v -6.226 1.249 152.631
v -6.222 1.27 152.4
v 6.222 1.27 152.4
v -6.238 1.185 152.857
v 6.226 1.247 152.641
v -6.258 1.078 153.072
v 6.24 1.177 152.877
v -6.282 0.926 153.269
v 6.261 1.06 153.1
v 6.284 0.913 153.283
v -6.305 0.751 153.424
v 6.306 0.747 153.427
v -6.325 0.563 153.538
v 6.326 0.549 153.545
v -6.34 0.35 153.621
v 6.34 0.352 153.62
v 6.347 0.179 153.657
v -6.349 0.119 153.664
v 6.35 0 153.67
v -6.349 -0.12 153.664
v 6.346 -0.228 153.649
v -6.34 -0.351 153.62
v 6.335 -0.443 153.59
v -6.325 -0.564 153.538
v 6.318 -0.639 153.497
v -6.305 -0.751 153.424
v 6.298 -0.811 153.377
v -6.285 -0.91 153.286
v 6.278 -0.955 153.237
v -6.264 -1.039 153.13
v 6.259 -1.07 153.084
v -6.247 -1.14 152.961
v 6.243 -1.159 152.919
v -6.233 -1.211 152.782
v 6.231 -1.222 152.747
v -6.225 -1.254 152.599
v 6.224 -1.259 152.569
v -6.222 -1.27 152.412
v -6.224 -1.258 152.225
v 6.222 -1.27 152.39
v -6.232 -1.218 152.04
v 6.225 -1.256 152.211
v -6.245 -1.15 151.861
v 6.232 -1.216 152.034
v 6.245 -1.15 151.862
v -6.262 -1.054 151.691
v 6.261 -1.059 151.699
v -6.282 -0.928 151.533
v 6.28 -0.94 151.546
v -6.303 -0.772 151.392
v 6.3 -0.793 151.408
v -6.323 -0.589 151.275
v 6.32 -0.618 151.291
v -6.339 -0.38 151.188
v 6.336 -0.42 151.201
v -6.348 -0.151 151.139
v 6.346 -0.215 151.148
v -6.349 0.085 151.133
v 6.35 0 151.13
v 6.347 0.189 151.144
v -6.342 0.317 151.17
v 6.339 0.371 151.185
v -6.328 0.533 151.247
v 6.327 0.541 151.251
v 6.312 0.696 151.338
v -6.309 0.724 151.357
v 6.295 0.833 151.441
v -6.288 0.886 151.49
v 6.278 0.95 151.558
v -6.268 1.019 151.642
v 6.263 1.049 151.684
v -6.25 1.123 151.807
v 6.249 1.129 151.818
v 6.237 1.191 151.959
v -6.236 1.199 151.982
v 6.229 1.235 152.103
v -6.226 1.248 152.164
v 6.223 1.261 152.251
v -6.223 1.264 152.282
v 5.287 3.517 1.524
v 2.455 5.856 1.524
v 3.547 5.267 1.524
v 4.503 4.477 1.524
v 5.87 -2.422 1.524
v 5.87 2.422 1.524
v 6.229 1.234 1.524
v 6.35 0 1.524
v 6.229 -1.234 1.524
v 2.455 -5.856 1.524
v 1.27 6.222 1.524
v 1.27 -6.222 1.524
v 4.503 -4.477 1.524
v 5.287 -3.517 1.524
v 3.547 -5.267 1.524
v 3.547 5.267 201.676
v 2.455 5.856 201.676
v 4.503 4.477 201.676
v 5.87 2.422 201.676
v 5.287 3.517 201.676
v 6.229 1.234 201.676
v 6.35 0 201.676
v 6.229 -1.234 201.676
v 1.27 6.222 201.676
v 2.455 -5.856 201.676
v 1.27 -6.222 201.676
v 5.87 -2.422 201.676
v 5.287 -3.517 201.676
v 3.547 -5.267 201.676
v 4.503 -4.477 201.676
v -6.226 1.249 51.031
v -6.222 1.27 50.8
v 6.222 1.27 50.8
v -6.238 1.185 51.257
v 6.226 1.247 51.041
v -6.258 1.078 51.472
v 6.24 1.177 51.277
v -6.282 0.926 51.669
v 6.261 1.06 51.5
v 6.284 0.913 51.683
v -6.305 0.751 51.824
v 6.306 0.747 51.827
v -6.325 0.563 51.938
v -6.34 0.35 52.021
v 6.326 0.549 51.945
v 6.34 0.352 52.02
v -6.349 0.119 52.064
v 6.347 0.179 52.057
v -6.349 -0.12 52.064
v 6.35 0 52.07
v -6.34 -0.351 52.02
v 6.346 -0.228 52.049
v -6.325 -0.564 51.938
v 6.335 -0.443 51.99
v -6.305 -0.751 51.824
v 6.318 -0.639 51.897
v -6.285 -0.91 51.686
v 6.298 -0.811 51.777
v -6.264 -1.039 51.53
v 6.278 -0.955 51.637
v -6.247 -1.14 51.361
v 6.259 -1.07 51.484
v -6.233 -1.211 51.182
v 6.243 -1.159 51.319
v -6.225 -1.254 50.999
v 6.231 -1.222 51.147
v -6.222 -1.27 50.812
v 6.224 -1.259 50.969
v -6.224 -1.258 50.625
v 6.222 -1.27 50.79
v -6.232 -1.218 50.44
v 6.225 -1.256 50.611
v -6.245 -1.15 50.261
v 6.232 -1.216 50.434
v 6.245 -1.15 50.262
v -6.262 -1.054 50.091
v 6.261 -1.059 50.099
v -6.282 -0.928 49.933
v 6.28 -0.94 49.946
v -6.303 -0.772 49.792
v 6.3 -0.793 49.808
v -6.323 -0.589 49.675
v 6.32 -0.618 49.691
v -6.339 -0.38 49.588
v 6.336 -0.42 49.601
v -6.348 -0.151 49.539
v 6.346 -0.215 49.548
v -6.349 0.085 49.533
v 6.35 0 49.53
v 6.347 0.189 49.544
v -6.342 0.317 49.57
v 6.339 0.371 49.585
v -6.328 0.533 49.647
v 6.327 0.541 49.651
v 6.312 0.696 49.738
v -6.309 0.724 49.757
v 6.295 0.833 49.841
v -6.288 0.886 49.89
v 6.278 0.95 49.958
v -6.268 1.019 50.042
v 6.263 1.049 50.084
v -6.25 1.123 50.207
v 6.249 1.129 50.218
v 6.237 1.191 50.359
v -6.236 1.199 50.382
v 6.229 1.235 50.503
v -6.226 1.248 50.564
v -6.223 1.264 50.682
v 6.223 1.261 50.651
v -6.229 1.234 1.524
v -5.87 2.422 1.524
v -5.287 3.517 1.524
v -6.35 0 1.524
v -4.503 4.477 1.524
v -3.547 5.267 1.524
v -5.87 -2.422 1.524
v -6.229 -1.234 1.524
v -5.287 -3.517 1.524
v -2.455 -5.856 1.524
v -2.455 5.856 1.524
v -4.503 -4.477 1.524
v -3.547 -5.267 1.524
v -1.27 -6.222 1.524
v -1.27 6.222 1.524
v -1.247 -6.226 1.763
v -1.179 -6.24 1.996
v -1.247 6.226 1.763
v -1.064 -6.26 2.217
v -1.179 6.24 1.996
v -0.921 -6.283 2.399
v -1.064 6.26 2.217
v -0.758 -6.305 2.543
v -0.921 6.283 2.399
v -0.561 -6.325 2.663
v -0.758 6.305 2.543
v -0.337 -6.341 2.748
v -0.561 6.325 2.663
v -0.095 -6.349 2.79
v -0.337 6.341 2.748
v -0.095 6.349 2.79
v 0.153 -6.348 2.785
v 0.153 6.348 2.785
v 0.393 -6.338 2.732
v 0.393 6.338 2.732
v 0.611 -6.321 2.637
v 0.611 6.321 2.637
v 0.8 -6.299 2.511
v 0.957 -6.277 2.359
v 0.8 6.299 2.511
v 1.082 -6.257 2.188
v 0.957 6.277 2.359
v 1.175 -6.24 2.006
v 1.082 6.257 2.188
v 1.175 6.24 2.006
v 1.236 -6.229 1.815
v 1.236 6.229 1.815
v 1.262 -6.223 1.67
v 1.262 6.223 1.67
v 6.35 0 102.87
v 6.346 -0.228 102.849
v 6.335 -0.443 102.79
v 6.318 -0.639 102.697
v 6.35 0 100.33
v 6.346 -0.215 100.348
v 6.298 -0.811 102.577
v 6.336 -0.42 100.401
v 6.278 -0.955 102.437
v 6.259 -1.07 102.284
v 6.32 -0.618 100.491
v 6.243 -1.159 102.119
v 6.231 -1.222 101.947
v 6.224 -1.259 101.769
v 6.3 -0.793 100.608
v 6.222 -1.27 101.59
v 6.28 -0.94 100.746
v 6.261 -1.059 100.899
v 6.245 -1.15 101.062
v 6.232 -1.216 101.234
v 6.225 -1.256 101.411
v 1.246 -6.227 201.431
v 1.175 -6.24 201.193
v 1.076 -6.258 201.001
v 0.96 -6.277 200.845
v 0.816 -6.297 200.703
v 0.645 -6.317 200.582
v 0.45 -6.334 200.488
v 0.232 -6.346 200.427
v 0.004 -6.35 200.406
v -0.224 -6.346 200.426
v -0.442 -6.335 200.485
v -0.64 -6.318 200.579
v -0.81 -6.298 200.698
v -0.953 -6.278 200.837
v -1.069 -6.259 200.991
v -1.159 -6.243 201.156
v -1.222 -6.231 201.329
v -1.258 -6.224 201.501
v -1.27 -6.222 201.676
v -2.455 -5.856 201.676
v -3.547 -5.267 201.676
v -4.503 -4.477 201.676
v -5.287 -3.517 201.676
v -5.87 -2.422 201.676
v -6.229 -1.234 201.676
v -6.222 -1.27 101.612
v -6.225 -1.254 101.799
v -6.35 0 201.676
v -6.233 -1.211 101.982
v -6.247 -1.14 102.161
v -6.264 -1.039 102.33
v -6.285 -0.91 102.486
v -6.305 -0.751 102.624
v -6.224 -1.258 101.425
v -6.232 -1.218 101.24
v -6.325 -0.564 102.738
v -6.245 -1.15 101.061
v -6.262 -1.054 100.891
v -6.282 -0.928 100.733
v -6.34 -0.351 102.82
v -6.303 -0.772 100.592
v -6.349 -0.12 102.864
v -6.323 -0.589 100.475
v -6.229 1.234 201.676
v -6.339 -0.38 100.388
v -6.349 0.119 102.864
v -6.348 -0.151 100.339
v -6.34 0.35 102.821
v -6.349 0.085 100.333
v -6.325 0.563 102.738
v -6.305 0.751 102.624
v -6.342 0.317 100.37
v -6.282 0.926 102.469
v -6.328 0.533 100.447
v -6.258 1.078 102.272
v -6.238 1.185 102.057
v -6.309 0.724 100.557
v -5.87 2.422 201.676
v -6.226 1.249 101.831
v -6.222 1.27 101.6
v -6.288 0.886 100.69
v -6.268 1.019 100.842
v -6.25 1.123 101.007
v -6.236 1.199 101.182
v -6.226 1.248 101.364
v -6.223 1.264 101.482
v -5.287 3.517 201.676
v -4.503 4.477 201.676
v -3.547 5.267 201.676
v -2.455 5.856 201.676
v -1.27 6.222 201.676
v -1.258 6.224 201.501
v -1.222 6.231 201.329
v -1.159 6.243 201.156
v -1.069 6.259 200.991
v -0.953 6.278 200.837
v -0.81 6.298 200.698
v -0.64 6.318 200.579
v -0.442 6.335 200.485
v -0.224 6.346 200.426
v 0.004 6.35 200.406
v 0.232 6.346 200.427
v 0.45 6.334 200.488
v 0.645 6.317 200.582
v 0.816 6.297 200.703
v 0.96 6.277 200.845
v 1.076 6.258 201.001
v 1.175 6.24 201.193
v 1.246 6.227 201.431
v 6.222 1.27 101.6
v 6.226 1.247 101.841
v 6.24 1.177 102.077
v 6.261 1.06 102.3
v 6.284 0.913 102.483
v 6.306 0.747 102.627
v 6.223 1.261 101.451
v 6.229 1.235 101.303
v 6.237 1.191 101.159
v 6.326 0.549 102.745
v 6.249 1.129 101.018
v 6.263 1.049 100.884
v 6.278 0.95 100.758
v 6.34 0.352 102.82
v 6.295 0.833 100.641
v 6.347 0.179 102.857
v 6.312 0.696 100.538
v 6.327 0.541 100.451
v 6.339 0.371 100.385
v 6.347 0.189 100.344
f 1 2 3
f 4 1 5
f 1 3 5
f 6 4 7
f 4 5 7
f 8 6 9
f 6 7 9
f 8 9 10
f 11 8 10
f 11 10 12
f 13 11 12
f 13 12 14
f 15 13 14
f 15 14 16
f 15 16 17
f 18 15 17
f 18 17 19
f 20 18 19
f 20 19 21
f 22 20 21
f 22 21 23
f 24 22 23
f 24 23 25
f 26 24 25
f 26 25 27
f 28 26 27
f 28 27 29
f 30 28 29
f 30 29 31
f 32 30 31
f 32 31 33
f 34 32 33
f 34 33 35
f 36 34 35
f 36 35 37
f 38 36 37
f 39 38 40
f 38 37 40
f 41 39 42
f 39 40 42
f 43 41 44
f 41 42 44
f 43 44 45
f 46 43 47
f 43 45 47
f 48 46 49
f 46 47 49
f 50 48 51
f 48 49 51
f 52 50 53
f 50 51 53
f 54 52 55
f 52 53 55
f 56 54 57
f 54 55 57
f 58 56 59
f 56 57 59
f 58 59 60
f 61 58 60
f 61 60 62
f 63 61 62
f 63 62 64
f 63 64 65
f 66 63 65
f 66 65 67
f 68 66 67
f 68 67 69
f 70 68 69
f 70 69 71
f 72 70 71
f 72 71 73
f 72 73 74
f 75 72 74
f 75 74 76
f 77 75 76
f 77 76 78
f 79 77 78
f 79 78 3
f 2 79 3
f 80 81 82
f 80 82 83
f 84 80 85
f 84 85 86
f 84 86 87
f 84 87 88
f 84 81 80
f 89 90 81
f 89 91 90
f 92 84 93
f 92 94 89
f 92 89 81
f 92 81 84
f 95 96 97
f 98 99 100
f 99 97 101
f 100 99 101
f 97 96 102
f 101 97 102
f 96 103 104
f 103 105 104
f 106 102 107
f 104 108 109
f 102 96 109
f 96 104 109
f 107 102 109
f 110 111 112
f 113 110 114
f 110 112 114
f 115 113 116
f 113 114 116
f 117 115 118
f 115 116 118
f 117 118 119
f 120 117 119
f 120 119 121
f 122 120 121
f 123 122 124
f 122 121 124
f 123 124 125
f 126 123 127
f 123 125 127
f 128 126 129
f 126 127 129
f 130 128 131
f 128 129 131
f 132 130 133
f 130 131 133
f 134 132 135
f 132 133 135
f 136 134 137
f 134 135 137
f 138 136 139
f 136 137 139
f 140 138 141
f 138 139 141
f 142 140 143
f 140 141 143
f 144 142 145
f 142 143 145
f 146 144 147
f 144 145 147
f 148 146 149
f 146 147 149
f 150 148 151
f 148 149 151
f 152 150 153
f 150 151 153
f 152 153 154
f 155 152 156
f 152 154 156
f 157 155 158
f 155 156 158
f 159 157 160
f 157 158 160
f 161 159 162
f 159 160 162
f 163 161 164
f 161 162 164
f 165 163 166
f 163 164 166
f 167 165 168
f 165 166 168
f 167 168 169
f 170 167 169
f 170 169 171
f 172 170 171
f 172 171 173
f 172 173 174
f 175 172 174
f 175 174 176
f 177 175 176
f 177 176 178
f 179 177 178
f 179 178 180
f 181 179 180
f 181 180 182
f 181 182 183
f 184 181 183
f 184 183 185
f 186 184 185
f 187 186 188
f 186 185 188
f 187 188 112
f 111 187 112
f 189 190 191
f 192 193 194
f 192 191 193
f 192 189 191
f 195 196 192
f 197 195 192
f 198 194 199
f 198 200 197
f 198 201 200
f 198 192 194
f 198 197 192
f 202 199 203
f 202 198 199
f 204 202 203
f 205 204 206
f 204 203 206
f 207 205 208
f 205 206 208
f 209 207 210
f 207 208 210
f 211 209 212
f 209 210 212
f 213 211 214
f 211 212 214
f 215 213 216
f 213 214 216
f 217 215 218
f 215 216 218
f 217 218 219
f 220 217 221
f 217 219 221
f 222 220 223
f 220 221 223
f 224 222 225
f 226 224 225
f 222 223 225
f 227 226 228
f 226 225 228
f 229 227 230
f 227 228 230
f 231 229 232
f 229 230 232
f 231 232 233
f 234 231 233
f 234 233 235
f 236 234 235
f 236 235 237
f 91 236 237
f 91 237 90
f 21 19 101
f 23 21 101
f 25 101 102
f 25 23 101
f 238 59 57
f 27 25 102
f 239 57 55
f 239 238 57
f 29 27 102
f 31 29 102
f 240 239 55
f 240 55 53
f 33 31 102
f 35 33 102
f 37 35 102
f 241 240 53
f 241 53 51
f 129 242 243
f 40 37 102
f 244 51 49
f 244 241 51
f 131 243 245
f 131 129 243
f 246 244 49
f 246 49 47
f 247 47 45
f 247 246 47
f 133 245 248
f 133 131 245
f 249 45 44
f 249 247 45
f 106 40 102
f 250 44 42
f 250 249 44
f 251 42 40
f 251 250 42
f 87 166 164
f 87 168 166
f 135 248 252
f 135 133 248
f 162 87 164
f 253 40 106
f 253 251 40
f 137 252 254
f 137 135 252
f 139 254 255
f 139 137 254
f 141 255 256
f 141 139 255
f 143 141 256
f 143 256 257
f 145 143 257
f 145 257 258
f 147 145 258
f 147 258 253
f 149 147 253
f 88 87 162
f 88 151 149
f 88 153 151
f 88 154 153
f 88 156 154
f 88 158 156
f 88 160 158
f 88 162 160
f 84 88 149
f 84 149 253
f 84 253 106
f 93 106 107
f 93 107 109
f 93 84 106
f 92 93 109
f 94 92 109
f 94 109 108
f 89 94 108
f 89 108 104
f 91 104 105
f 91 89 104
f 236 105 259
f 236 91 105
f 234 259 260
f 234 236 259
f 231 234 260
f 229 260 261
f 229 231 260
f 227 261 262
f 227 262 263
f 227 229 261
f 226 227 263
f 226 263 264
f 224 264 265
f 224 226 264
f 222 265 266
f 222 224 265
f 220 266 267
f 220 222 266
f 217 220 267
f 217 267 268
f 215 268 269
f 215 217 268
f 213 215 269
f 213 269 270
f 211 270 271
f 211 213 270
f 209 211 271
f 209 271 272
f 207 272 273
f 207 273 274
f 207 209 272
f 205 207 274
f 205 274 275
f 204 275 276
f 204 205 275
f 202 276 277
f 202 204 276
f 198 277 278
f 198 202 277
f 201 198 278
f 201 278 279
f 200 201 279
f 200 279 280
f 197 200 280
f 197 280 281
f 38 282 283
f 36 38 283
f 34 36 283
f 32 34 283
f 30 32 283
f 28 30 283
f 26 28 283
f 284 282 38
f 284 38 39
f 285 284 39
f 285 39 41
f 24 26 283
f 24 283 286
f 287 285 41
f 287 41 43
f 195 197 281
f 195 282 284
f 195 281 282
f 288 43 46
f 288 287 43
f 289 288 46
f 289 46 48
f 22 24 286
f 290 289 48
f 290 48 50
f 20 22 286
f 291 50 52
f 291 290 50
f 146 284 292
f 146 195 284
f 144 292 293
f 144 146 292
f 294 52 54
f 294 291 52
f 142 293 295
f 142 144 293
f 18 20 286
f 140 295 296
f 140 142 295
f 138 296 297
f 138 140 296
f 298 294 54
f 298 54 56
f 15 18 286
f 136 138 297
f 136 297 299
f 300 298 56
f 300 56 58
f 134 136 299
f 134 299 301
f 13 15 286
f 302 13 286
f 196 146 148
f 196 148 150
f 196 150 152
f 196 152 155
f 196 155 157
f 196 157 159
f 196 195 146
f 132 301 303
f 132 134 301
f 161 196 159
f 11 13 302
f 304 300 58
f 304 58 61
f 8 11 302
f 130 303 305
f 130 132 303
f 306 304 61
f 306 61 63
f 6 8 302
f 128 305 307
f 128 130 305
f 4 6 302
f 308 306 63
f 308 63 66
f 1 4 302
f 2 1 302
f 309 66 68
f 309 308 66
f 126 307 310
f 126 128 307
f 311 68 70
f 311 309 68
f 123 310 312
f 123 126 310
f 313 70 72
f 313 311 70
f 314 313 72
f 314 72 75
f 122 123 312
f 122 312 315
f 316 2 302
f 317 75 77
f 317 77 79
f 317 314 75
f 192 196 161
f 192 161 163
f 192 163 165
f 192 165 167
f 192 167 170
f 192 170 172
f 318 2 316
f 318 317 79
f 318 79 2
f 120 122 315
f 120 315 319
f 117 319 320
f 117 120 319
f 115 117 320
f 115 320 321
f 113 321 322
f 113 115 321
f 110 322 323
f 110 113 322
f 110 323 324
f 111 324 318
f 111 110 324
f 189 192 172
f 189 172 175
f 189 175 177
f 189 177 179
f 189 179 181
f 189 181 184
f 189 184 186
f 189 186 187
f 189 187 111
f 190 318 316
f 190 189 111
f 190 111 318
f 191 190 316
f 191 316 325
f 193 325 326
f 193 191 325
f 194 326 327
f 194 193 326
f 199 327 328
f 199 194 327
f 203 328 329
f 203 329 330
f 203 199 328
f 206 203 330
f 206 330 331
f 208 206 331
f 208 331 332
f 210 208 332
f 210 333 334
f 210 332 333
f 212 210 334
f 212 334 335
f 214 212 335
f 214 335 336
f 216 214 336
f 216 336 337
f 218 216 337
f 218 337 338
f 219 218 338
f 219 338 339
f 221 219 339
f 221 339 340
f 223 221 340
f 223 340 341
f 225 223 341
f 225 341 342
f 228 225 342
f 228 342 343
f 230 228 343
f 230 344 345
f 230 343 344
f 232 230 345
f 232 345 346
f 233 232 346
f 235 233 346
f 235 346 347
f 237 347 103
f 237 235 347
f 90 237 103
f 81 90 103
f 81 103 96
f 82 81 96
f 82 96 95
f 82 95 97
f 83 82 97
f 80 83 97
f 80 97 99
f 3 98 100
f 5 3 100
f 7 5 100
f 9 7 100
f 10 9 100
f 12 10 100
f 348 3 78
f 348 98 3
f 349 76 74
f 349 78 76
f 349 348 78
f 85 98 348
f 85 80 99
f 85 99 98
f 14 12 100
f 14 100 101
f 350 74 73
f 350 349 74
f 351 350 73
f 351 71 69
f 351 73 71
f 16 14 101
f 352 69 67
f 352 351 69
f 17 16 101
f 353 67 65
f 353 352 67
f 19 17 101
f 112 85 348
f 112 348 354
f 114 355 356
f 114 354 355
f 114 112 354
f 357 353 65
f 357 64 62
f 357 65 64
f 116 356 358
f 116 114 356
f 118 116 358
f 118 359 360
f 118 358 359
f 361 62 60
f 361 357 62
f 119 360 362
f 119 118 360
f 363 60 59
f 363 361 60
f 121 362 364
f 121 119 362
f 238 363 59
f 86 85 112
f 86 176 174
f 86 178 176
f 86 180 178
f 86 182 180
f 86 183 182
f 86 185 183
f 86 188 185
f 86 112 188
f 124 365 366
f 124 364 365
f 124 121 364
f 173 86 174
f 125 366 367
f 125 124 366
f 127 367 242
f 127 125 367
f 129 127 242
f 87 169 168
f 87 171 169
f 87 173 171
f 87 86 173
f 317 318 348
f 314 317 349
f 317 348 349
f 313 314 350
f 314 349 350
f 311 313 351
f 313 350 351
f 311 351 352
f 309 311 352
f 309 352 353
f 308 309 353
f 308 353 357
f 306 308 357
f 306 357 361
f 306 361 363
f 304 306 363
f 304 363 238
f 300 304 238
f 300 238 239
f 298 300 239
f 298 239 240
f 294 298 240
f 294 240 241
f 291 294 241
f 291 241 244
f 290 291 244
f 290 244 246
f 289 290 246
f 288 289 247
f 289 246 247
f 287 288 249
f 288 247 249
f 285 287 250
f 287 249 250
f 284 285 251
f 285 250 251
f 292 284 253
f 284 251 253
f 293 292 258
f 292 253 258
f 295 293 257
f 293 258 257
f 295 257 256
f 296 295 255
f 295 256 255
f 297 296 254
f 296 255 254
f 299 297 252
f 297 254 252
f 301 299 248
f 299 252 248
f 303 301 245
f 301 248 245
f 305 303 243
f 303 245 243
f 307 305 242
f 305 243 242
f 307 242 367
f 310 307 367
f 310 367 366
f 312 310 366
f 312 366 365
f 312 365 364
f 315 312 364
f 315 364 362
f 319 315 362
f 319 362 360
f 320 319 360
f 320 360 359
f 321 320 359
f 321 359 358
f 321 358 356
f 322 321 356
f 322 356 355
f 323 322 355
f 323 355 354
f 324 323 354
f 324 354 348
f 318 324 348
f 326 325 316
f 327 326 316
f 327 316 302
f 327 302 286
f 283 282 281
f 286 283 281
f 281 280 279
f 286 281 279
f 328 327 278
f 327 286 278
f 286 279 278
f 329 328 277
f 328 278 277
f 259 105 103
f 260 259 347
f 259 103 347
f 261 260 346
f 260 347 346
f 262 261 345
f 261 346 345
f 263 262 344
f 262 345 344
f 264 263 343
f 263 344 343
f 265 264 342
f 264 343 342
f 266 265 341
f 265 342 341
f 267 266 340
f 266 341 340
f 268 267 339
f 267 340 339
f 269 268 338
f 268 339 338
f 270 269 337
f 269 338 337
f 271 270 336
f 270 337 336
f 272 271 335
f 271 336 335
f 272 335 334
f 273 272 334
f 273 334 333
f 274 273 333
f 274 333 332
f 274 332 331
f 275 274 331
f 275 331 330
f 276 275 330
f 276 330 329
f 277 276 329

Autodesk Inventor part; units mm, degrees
ref_plane "YZ Plane" through (0, 0, 0) normal (1, 0, 0) x (0, 1, 0)
ref_plane "XZ Plane" through (0, 0, 0) normal (0, 1, 0) x (-1, 0, 0)
ref_plane "XY Plane" through (0, 0, 0) normal (0, 0, 1) x (1, 0, 0)
sketch "Sketch1" plane through (0, 0, 0) normal (0, 0, 1) x (1, 0, 0)
  circle A0 centre (0, 0) radius 6.35
  dimension "d0" = 12.7
extrude "Extrusion1" add sketch "Sketch1" along normal blind 203.2
sketch "Sketch4" plane through (0, 0, 0) normal (0, 1, 0) x (-1, 0, 0)
  line L0 (0, 0) -> (0, 1.524)
  line L1 (6.35, 203.2) -> (-6.35, 203.2) projected
  line L2 (0, 203.2) -> (0, 201.676)
  circle A0 centre (0, 201.676) radius 1.27
  circle A1 centre (0, 1.524) radius 1.27
  dimension "d13" = 1.524
  dimension "d15" = 1.524
  dimension "d16" = 2.54
  dimension "d19" = 2.54
extrude "Extrusion4" cut sketch "Sketch4" along normal mid plane 15.24
sketch "Sketch5" plane through (0, 0, 0) normal (0, 1, 0) x (-1, 0, 0)
  line L0 (0, 1.524) -> (-1.27, 1.524)
  line L1 (-6.35, 0) -> (6.35, 0) projected
  line L2 (-1.27, 0) -> (1.27, 0)
  line L3 (1.27, 1.524) -> (0, 1.524)
  line L4 (1.27, 1.524) -> (6.35, 1.524)
  line L5 (6.35, 0) -> (6.35, 203.2) projected
  line L6 (6.35, 1.524) -> (-6.35, 1.524)
  line L7 (-6.35, 1.524) -> (-6.35, 0)
  line L8 (-6.35, 0) -> (6.35, 0)
  line L9 (6.35, 0) -> (6.35, 1.524)
  line L10 (6.35, 203.2) -> (-6.35, 203.2) projected
  line L11 (-6.35, 203.2) -> (6.35, 203.2)
  line L12 (6.35, 203.2) -> (6.35, 201.676)
  line L13 (6.35, 201.676) -> (-6.35, 201.676)
  line L14 (-6.35, 201.676) -> (-6.35, 203.2)
  point P0 (0, 0)
  dimension "d20" = 1.524
  dimension "d21" = 1.27
  dimension "d26" = 12.7
  dimension "d27" = 1.524
extrude "Extrusion6" cut sketch "Sketch5" along normal mid plane 25.4
sketch "Sketch7" plane through (0, 0, 0) normal (1, 0, 0) x (0, 1, 0)
  line L0 (0, 0) -> (0, 50.8)
  circle A0 centre (0, 50.8) radius 1.27
  line L1 (0, 50.8) -> (0, 101.6)
  circle A1 centre (0, 101.6) radius 1.27
  line L2 (0, 101.6) -> (0, 152.4)
  circle A2 centre (0, 152.4) radius 1.27
  dimension "d42" = 50.8
  dimension "d43" = 2.54
  dimension "d44" = 50.8
  dimension "d45" = 2.54
  dimension "d46" = 50.8
  dimension "d47" = 2.54
extrude "Extrusion8" cut sketch "Sketch7" along normal mid plane 25.4
properties part number "Straw"
